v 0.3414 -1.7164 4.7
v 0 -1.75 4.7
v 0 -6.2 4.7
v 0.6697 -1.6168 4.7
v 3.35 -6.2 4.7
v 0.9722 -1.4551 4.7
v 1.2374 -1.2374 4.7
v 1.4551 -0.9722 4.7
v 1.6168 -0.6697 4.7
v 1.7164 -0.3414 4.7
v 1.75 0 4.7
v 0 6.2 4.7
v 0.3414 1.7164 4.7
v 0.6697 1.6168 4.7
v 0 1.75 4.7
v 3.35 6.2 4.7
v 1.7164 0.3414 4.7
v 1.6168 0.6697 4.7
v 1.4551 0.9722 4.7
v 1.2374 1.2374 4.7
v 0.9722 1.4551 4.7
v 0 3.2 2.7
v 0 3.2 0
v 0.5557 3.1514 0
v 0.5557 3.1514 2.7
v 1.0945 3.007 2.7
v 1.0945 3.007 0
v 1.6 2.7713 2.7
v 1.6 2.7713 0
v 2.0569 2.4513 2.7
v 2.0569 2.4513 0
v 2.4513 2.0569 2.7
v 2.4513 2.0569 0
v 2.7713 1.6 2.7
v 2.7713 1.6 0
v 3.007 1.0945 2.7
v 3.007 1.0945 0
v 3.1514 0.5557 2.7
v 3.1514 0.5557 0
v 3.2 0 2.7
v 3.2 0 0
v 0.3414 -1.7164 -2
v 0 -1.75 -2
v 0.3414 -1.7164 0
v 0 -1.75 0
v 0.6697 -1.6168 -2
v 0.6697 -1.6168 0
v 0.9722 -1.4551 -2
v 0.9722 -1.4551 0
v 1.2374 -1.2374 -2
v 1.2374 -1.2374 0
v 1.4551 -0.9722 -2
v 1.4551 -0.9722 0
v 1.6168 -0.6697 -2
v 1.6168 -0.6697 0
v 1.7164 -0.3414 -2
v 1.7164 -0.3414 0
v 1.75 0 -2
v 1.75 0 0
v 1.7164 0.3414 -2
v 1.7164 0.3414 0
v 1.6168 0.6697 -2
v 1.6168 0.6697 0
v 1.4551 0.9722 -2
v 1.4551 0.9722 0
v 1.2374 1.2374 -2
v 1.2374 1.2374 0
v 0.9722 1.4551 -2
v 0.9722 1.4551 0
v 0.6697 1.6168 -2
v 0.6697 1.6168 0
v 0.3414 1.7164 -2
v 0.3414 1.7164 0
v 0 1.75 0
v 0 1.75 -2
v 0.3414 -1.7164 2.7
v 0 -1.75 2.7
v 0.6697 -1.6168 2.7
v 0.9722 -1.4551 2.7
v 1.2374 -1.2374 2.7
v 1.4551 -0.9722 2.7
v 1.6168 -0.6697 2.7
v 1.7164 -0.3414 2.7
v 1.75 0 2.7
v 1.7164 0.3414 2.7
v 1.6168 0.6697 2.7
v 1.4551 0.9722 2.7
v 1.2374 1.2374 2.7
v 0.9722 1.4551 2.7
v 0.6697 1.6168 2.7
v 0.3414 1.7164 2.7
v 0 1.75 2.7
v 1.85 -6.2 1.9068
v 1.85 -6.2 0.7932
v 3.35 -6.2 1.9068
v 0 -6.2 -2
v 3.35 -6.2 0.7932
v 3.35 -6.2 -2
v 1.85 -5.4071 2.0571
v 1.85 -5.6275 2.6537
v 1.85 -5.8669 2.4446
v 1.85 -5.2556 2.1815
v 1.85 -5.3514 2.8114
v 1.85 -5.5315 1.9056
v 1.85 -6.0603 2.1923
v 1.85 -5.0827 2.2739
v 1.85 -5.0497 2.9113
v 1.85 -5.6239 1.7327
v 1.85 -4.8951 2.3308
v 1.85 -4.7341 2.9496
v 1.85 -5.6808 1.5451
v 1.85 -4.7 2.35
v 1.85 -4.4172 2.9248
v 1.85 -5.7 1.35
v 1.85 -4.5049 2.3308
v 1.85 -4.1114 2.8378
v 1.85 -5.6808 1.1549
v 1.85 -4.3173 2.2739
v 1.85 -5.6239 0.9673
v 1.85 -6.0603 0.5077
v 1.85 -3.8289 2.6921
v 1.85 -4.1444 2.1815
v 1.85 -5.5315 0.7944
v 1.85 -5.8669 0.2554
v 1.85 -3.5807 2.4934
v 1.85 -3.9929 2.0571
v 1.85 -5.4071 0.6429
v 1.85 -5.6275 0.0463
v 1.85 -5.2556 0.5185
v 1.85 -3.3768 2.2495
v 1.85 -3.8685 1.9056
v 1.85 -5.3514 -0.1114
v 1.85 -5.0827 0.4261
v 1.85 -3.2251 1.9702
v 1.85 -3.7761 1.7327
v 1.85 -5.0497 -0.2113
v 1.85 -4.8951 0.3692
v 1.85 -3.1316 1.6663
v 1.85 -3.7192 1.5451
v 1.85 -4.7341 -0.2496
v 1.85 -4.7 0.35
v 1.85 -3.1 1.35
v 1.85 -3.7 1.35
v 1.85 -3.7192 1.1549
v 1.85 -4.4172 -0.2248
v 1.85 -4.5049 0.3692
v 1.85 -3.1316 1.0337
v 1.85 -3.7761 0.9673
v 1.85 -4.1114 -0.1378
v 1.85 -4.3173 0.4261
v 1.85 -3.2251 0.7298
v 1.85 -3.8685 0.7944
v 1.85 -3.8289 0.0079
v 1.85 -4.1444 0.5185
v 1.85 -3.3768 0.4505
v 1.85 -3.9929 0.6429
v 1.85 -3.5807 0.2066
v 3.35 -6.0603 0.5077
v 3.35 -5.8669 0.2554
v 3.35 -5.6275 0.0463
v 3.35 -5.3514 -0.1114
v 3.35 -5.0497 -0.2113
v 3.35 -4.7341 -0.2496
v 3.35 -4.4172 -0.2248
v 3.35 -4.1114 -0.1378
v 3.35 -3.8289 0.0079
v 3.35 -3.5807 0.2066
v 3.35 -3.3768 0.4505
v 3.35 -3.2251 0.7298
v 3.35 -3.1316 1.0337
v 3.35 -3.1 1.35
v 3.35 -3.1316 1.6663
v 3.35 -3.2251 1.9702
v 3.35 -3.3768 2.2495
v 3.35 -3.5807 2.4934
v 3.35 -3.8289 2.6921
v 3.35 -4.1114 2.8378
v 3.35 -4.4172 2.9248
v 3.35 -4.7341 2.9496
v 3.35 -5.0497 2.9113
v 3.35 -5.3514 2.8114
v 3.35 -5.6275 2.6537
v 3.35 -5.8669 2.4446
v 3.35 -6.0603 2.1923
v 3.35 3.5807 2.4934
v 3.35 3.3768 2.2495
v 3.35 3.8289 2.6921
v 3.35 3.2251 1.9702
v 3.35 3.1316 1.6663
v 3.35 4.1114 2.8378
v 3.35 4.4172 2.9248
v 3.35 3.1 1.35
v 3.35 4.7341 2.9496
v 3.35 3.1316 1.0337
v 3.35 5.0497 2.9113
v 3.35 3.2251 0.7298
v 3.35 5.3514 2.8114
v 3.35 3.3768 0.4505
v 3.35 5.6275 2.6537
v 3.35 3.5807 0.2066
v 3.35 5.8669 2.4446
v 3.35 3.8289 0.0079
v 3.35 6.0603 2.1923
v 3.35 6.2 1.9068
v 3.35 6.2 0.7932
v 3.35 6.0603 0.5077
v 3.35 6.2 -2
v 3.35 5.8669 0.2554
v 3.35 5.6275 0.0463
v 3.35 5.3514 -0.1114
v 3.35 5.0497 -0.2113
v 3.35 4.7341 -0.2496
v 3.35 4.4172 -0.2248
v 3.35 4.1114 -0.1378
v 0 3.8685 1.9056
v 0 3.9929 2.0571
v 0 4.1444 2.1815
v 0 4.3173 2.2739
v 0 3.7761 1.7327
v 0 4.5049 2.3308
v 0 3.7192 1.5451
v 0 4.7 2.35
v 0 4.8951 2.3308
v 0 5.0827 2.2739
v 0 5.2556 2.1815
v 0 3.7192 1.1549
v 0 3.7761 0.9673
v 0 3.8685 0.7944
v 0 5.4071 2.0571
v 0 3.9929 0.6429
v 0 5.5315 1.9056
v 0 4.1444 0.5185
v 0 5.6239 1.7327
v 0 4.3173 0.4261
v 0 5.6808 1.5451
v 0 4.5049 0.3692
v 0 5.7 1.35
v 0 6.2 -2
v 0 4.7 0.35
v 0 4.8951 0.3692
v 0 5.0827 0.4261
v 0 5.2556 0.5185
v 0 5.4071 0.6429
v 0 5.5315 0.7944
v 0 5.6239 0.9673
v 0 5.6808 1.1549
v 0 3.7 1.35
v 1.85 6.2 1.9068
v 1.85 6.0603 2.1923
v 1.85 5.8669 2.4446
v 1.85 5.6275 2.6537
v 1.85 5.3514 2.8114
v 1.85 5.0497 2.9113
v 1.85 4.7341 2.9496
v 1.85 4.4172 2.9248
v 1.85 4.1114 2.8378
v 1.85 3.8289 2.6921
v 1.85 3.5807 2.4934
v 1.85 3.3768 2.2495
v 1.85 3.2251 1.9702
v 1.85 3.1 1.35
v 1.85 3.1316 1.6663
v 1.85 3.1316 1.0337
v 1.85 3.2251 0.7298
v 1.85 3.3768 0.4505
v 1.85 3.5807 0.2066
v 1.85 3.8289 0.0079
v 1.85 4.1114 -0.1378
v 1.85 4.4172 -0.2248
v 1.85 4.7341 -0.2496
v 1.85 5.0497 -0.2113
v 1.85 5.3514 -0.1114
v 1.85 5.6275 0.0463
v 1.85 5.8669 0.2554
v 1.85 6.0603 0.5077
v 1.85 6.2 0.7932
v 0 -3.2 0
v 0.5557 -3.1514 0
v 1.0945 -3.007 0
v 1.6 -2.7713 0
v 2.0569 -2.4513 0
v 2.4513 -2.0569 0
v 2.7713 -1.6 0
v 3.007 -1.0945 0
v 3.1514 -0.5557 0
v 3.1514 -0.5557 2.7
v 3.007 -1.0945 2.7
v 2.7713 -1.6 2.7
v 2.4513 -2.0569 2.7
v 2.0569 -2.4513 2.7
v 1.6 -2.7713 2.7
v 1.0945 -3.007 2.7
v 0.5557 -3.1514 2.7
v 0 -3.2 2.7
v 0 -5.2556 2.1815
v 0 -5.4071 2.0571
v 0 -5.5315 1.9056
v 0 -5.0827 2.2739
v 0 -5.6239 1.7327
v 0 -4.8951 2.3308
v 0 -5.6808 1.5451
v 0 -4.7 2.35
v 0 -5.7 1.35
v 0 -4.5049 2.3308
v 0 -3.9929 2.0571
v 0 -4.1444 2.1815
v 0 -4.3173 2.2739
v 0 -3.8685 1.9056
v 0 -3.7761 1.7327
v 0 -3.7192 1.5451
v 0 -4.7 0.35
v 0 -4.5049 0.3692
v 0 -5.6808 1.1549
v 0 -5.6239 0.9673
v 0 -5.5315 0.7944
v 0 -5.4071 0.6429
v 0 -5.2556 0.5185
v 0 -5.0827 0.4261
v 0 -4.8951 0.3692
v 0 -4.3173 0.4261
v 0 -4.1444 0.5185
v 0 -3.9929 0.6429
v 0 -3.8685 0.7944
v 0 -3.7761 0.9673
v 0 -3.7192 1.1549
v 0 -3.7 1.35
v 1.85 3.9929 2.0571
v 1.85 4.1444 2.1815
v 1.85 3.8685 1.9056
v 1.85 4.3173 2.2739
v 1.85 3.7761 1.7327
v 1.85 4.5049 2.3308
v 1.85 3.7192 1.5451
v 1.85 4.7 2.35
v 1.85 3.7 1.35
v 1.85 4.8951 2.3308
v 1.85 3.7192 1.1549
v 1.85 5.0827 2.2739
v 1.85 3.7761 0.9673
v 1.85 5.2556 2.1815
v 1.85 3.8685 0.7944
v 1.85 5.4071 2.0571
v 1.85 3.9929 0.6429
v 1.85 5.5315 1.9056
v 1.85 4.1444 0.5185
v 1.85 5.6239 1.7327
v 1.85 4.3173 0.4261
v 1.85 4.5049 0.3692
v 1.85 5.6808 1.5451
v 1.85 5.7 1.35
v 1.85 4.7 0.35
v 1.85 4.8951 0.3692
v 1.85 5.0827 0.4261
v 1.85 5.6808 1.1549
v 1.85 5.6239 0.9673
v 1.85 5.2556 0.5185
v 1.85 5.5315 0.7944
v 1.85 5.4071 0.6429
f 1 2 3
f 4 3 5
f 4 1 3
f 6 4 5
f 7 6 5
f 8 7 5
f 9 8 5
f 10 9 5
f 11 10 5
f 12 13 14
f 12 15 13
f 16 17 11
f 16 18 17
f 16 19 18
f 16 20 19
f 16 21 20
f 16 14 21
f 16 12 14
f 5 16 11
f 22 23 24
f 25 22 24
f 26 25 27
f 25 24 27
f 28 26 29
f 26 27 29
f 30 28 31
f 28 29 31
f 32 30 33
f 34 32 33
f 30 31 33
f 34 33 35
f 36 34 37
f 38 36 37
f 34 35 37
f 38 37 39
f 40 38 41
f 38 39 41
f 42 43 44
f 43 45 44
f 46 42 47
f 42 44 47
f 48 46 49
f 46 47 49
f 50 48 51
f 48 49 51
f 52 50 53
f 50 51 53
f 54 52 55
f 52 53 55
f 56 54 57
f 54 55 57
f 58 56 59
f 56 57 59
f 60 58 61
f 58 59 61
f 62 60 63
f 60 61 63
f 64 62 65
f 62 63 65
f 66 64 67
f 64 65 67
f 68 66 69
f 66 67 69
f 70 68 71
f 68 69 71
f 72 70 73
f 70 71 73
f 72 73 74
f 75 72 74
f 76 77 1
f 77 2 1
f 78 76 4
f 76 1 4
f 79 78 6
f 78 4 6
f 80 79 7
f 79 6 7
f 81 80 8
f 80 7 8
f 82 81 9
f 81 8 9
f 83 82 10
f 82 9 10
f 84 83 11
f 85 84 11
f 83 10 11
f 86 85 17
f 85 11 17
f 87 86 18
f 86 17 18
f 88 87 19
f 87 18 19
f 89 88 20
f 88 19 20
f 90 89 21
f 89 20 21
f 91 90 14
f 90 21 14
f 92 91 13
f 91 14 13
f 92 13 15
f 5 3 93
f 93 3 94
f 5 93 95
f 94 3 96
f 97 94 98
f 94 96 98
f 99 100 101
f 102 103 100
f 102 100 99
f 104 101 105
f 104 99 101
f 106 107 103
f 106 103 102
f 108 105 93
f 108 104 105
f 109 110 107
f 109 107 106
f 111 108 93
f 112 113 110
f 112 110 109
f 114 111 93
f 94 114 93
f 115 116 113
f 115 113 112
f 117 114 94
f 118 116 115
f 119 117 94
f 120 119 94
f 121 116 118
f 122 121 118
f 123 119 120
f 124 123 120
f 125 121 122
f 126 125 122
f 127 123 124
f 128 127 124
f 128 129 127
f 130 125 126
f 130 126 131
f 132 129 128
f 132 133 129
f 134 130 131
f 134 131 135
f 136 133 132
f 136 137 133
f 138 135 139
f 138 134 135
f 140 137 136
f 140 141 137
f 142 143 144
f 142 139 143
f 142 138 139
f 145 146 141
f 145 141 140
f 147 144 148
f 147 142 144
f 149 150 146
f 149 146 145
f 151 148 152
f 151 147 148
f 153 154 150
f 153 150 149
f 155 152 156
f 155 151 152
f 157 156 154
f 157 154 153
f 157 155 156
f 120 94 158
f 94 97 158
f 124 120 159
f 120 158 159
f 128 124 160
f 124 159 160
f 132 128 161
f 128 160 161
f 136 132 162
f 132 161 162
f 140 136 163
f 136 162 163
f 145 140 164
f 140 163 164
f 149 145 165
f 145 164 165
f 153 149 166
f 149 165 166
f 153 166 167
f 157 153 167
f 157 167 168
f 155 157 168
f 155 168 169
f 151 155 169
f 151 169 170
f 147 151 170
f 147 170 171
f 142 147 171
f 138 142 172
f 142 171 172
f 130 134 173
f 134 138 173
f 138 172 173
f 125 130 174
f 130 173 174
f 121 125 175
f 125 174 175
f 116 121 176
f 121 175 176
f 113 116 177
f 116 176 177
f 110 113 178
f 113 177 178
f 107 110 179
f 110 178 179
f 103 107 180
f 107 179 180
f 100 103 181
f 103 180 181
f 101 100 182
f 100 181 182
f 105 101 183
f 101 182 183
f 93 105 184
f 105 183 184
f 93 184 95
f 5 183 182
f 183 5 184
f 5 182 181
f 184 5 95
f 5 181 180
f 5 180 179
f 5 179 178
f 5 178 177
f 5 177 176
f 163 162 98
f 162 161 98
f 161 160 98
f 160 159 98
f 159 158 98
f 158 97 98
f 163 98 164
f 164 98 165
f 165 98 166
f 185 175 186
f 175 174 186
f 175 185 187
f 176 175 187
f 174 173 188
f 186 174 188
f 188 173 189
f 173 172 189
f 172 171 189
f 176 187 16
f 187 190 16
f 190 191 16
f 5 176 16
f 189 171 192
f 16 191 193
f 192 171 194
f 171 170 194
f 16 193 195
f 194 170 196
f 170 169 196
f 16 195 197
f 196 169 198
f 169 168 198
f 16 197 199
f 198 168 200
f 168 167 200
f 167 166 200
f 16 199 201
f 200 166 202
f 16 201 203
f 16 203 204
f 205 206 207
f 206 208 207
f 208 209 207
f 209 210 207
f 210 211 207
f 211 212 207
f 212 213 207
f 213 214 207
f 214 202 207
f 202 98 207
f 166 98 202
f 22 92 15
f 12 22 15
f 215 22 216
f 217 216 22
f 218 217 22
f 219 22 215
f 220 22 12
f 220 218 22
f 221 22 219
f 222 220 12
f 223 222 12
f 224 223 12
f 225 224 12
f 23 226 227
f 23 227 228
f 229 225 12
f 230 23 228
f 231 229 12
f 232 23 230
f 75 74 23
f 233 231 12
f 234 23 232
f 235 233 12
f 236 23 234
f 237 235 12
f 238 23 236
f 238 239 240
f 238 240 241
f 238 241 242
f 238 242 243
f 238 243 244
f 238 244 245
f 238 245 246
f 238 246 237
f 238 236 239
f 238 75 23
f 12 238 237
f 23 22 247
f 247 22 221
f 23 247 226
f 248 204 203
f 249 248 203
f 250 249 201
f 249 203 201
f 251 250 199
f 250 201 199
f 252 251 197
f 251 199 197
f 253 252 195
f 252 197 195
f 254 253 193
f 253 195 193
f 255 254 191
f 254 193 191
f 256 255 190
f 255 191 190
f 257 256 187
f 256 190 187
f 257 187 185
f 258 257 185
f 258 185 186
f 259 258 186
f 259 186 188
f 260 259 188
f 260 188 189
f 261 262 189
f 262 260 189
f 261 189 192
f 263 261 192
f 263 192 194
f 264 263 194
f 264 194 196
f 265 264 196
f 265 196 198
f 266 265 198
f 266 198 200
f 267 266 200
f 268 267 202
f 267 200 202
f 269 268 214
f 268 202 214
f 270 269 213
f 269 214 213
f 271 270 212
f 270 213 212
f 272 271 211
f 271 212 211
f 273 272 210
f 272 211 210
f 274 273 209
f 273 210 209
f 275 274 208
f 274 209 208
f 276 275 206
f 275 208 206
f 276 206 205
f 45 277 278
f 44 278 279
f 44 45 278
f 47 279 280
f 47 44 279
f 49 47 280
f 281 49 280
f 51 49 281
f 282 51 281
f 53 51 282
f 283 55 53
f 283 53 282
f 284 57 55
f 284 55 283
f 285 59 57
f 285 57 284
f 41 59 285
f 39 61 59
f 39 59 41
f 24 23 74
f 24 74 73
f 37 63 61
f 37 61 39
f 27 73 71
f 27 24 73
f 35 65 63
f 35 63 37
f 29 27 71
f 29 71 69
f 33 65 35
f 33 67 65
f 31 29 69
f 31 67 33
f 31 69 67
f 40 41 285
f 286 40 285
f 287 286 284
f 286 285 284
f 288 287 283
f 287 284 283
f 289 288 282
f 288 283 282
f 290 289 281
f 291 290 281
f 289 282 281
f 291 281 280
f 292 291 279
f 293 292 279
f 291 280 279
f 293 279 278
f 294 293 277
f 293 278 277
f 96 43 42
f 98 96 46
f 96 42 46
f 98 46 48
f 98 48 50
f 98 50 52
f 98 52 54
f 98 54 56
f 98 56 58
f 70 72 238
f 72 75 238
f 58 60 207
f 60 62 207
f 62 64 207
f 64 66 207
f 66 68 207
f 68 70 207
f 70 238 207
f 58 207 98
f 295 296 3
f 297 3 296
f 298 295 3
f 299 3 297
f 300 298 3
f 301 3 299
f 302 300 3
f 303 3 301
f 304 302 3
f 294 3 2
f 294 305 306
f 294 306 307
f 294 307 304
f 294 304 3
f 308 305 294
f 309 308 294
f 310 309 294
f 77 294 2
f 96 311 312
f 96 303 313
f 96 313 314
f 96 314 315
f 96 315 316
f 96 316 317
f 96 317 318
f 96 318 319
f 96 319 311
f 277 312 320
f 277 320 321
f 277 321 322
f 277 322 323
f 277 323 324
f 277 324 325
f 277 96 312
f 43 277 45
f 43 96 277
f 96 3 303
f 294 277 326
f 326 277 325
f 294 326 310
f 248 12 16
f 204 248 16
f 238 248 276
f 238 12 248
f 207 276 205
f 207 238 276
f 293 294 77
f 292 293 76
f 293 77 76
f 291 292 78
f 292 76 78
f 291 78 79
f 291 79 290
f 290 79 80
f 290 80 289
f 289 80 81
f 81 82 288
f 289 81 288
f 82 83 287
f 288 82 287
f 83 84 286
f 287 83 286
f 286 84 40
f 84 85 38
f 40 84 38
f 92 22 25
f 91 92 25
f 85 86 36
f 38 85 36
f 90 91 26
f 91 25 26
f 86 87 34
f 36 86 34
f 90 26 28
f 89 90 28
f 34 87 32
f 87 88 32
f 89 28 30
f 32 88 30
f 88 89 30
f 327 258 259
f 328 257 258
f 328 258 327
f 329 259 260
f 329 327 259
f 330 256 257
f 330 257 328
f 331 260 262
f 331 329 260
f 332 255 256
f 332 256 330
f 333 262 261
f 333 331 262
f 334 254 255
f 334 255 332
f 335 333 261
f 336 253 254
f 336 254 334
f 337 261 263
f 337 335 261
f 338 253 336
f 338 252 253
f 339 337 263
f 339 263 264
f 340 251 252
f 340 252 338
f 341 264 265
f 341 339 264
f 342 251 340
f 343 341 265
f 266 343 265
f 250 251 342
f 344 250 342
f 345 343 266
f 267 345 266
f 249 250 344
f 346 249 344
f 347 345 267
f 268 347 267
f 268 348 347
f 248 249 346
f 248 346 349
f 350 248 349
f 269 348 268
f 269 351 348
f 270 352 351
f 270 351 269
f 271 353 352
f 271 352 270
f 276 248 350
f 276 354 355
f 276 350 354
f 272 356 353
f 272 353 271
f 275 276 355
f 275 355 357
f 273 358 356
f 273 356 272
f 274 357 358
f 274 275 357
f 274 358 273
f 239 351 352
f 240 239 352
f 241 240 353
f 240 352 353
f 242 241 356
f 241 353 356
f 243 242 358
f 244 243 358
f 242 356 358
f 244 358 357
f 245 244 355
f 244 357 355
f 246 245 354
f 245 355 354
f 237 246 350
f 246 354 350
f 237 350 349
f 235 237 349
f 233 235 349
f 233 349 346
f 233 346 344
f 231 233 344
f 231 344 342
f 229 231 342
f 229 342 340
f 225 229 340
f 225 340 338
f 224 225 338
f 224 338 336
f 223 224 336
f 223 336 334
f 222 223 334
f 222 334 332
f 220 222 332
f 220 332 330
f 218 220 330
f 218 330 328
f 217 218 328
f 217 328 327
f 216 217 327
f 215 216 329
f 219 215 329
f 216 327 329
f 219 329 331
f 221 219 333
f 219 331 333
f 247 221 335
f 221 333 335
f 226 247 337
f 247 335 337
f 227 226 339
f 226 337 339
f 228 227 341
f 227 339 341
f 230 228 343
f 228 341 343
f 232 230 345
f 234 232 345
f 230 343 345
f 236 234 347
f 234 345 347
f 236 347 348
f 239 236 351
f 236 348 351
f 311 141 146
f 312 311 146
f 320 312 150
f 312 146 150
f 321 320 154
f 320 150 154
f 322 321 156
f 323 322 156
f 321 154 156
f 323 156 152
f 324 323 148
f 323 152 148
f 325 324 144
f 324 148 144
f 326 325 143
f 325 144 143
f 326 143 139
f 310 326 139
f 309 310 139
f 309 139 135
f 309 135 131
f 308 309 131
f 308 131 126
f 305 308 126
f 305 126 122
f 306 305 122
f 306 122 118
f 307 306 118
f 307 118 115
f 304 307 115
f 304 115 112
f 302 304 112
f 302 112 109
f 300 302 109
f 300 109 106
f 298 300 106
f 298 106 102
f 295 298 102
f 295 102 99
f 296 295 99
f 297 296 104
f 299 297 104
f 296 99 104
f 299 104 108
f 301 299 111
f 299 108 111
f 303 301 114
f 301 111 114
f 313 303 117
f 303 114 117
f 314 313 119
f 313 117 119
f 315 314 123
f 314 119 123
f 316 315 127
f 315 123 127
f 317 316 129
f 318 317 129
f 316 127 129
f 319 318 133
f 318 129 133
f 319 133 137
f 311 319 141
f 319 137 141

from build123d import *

# Parameters (mm, degrees)
EXTRUDE_1_DEPTH     = 2.7
SKETCH_1_4_W        = 3.35
SKETCH_1_4_H        = 12.4
EXTRUDE_2_DEPTH     = 2
EXTRUDE_START       = 2.7
SKETCH_1_5_W        = 3.35
SKETCH_1_5_H        = 12.4
EXTRUDE_3_DEPTH     = 2
SKETCH_2_R          = 1.75
CUT_EXTRUDE_1_DEPTH = 10.723810981
SKETCH_4_R          = 1
CUT_EXTRUDE_2_DEPTH = 9.470684742
SKETCH_4_3_R        = 1.6
SKETCH_4_3_R_2      = 1
CUT_EXTRUDE_3_DEPTH = 1.5


with BuildPart() as part:
    # 草图1 → 凸台-拉伸1 (new body)
    with BuildSketch(Plane.XY):
        with BuildLine():
            Line((3.35, 6.2), (0, 6.2))
            Line((0, 6.2), (0, 3.2))
            ThreePointArc((0, 3.2), (2.2627417, 2.2627417), (3.2, 0))
            ThreePointArc((3.2, 0), (2.2627417, -2.2627417), (0, -3.2))
            Line((0, -3.2), (0, -6.2))
            Line((0, -6.2), (3.35, -6.2))
            Line((3.35, -6.2), (3.35, 6.2))
        make_face()
    extrude(amount=EXTRUDE_1_DEPTH)

    # 草图1<4> → 凸台-拉伸2 (add)
    with BuildSketch(Plane.XY):
        with Locations((1.675, 0)):
            Rectangle(SKETCH_1_4_W, SKETCH_1_4_H)
    extrude(amount=-EXTRUDE_2_DEPTH)

    # 草图1<5> → 凸台-拉伸3 (add)
    with BuildSketch(Plane.XY.offset(EXTRUDE_START)):
        with Locations((1.675, 0)):
            Rectangle(SKETCH_1_5_W, SKETCH_1_5_H)
    extrude(amount=EXTRUDE_3_DEPTH)

    # 草图2 → 切除-拉伸1 (cut, through all)
    with BuildSketch(Plane.XY.offset(4.7)):
        Circle(SKETCH_2_R)
    extrude(amount=-CUT_EXTRUDE_1_DEPTH, mode=Mode.SUBTRACT)

    # 草图4 → 切除-拉伸2 (cut, through all)
    with BuildSketch(Plane(origin=(3.35, 0, 0), x_dir=(0, 0, -1), z_dir=(1, 0, 0))):
        with Locations((-1.35, -4.7)):
            Circle(SKETCH_4_R)
        with Locations((-1.35, 4.7)):
            Circle(SKETCH_4_R)
    extrude(amount=-CUT_EXTRUDE_2_DEPTH, mode=Mode.SUBTRACT)

    # 草图4<3> → 切除-拉伸3 (cut)
    # profile 1 of 2: a face of its own
    with BuildSketch(Plane(origin=(3.35, 0, 0), x_dir=(0, 0, -1), z_dir=(1, 0, 0))):
        with Locations((-1.35, 4.7)):
            Circle(SKETCH_4_3_R)
        with Locations((-1.35, 4.7)):
            Circle(SKETCH_4_3_R_2, mode=Mode.SUBTRACT)
    # profile 2 of 2: a face of its own
    with BuildSketch(Plane(origin=(3.35, 0, 0), x_dir=(0, 0, -1), z_dir=(1, 0, 0))):
        with Locations((-1.35, -4.7)):
            Circle(SKETCH_4_3_R)
        with Locations((-1.35, -4.7)):
            Circle(SKETCH_4_3_R_2, mode=Mode.SUBTRACT)
    extrude(amount=-CUT_EXTRUDE_3_DEPTH, mode=Mode.SUBTRACT)


solid = part.part
